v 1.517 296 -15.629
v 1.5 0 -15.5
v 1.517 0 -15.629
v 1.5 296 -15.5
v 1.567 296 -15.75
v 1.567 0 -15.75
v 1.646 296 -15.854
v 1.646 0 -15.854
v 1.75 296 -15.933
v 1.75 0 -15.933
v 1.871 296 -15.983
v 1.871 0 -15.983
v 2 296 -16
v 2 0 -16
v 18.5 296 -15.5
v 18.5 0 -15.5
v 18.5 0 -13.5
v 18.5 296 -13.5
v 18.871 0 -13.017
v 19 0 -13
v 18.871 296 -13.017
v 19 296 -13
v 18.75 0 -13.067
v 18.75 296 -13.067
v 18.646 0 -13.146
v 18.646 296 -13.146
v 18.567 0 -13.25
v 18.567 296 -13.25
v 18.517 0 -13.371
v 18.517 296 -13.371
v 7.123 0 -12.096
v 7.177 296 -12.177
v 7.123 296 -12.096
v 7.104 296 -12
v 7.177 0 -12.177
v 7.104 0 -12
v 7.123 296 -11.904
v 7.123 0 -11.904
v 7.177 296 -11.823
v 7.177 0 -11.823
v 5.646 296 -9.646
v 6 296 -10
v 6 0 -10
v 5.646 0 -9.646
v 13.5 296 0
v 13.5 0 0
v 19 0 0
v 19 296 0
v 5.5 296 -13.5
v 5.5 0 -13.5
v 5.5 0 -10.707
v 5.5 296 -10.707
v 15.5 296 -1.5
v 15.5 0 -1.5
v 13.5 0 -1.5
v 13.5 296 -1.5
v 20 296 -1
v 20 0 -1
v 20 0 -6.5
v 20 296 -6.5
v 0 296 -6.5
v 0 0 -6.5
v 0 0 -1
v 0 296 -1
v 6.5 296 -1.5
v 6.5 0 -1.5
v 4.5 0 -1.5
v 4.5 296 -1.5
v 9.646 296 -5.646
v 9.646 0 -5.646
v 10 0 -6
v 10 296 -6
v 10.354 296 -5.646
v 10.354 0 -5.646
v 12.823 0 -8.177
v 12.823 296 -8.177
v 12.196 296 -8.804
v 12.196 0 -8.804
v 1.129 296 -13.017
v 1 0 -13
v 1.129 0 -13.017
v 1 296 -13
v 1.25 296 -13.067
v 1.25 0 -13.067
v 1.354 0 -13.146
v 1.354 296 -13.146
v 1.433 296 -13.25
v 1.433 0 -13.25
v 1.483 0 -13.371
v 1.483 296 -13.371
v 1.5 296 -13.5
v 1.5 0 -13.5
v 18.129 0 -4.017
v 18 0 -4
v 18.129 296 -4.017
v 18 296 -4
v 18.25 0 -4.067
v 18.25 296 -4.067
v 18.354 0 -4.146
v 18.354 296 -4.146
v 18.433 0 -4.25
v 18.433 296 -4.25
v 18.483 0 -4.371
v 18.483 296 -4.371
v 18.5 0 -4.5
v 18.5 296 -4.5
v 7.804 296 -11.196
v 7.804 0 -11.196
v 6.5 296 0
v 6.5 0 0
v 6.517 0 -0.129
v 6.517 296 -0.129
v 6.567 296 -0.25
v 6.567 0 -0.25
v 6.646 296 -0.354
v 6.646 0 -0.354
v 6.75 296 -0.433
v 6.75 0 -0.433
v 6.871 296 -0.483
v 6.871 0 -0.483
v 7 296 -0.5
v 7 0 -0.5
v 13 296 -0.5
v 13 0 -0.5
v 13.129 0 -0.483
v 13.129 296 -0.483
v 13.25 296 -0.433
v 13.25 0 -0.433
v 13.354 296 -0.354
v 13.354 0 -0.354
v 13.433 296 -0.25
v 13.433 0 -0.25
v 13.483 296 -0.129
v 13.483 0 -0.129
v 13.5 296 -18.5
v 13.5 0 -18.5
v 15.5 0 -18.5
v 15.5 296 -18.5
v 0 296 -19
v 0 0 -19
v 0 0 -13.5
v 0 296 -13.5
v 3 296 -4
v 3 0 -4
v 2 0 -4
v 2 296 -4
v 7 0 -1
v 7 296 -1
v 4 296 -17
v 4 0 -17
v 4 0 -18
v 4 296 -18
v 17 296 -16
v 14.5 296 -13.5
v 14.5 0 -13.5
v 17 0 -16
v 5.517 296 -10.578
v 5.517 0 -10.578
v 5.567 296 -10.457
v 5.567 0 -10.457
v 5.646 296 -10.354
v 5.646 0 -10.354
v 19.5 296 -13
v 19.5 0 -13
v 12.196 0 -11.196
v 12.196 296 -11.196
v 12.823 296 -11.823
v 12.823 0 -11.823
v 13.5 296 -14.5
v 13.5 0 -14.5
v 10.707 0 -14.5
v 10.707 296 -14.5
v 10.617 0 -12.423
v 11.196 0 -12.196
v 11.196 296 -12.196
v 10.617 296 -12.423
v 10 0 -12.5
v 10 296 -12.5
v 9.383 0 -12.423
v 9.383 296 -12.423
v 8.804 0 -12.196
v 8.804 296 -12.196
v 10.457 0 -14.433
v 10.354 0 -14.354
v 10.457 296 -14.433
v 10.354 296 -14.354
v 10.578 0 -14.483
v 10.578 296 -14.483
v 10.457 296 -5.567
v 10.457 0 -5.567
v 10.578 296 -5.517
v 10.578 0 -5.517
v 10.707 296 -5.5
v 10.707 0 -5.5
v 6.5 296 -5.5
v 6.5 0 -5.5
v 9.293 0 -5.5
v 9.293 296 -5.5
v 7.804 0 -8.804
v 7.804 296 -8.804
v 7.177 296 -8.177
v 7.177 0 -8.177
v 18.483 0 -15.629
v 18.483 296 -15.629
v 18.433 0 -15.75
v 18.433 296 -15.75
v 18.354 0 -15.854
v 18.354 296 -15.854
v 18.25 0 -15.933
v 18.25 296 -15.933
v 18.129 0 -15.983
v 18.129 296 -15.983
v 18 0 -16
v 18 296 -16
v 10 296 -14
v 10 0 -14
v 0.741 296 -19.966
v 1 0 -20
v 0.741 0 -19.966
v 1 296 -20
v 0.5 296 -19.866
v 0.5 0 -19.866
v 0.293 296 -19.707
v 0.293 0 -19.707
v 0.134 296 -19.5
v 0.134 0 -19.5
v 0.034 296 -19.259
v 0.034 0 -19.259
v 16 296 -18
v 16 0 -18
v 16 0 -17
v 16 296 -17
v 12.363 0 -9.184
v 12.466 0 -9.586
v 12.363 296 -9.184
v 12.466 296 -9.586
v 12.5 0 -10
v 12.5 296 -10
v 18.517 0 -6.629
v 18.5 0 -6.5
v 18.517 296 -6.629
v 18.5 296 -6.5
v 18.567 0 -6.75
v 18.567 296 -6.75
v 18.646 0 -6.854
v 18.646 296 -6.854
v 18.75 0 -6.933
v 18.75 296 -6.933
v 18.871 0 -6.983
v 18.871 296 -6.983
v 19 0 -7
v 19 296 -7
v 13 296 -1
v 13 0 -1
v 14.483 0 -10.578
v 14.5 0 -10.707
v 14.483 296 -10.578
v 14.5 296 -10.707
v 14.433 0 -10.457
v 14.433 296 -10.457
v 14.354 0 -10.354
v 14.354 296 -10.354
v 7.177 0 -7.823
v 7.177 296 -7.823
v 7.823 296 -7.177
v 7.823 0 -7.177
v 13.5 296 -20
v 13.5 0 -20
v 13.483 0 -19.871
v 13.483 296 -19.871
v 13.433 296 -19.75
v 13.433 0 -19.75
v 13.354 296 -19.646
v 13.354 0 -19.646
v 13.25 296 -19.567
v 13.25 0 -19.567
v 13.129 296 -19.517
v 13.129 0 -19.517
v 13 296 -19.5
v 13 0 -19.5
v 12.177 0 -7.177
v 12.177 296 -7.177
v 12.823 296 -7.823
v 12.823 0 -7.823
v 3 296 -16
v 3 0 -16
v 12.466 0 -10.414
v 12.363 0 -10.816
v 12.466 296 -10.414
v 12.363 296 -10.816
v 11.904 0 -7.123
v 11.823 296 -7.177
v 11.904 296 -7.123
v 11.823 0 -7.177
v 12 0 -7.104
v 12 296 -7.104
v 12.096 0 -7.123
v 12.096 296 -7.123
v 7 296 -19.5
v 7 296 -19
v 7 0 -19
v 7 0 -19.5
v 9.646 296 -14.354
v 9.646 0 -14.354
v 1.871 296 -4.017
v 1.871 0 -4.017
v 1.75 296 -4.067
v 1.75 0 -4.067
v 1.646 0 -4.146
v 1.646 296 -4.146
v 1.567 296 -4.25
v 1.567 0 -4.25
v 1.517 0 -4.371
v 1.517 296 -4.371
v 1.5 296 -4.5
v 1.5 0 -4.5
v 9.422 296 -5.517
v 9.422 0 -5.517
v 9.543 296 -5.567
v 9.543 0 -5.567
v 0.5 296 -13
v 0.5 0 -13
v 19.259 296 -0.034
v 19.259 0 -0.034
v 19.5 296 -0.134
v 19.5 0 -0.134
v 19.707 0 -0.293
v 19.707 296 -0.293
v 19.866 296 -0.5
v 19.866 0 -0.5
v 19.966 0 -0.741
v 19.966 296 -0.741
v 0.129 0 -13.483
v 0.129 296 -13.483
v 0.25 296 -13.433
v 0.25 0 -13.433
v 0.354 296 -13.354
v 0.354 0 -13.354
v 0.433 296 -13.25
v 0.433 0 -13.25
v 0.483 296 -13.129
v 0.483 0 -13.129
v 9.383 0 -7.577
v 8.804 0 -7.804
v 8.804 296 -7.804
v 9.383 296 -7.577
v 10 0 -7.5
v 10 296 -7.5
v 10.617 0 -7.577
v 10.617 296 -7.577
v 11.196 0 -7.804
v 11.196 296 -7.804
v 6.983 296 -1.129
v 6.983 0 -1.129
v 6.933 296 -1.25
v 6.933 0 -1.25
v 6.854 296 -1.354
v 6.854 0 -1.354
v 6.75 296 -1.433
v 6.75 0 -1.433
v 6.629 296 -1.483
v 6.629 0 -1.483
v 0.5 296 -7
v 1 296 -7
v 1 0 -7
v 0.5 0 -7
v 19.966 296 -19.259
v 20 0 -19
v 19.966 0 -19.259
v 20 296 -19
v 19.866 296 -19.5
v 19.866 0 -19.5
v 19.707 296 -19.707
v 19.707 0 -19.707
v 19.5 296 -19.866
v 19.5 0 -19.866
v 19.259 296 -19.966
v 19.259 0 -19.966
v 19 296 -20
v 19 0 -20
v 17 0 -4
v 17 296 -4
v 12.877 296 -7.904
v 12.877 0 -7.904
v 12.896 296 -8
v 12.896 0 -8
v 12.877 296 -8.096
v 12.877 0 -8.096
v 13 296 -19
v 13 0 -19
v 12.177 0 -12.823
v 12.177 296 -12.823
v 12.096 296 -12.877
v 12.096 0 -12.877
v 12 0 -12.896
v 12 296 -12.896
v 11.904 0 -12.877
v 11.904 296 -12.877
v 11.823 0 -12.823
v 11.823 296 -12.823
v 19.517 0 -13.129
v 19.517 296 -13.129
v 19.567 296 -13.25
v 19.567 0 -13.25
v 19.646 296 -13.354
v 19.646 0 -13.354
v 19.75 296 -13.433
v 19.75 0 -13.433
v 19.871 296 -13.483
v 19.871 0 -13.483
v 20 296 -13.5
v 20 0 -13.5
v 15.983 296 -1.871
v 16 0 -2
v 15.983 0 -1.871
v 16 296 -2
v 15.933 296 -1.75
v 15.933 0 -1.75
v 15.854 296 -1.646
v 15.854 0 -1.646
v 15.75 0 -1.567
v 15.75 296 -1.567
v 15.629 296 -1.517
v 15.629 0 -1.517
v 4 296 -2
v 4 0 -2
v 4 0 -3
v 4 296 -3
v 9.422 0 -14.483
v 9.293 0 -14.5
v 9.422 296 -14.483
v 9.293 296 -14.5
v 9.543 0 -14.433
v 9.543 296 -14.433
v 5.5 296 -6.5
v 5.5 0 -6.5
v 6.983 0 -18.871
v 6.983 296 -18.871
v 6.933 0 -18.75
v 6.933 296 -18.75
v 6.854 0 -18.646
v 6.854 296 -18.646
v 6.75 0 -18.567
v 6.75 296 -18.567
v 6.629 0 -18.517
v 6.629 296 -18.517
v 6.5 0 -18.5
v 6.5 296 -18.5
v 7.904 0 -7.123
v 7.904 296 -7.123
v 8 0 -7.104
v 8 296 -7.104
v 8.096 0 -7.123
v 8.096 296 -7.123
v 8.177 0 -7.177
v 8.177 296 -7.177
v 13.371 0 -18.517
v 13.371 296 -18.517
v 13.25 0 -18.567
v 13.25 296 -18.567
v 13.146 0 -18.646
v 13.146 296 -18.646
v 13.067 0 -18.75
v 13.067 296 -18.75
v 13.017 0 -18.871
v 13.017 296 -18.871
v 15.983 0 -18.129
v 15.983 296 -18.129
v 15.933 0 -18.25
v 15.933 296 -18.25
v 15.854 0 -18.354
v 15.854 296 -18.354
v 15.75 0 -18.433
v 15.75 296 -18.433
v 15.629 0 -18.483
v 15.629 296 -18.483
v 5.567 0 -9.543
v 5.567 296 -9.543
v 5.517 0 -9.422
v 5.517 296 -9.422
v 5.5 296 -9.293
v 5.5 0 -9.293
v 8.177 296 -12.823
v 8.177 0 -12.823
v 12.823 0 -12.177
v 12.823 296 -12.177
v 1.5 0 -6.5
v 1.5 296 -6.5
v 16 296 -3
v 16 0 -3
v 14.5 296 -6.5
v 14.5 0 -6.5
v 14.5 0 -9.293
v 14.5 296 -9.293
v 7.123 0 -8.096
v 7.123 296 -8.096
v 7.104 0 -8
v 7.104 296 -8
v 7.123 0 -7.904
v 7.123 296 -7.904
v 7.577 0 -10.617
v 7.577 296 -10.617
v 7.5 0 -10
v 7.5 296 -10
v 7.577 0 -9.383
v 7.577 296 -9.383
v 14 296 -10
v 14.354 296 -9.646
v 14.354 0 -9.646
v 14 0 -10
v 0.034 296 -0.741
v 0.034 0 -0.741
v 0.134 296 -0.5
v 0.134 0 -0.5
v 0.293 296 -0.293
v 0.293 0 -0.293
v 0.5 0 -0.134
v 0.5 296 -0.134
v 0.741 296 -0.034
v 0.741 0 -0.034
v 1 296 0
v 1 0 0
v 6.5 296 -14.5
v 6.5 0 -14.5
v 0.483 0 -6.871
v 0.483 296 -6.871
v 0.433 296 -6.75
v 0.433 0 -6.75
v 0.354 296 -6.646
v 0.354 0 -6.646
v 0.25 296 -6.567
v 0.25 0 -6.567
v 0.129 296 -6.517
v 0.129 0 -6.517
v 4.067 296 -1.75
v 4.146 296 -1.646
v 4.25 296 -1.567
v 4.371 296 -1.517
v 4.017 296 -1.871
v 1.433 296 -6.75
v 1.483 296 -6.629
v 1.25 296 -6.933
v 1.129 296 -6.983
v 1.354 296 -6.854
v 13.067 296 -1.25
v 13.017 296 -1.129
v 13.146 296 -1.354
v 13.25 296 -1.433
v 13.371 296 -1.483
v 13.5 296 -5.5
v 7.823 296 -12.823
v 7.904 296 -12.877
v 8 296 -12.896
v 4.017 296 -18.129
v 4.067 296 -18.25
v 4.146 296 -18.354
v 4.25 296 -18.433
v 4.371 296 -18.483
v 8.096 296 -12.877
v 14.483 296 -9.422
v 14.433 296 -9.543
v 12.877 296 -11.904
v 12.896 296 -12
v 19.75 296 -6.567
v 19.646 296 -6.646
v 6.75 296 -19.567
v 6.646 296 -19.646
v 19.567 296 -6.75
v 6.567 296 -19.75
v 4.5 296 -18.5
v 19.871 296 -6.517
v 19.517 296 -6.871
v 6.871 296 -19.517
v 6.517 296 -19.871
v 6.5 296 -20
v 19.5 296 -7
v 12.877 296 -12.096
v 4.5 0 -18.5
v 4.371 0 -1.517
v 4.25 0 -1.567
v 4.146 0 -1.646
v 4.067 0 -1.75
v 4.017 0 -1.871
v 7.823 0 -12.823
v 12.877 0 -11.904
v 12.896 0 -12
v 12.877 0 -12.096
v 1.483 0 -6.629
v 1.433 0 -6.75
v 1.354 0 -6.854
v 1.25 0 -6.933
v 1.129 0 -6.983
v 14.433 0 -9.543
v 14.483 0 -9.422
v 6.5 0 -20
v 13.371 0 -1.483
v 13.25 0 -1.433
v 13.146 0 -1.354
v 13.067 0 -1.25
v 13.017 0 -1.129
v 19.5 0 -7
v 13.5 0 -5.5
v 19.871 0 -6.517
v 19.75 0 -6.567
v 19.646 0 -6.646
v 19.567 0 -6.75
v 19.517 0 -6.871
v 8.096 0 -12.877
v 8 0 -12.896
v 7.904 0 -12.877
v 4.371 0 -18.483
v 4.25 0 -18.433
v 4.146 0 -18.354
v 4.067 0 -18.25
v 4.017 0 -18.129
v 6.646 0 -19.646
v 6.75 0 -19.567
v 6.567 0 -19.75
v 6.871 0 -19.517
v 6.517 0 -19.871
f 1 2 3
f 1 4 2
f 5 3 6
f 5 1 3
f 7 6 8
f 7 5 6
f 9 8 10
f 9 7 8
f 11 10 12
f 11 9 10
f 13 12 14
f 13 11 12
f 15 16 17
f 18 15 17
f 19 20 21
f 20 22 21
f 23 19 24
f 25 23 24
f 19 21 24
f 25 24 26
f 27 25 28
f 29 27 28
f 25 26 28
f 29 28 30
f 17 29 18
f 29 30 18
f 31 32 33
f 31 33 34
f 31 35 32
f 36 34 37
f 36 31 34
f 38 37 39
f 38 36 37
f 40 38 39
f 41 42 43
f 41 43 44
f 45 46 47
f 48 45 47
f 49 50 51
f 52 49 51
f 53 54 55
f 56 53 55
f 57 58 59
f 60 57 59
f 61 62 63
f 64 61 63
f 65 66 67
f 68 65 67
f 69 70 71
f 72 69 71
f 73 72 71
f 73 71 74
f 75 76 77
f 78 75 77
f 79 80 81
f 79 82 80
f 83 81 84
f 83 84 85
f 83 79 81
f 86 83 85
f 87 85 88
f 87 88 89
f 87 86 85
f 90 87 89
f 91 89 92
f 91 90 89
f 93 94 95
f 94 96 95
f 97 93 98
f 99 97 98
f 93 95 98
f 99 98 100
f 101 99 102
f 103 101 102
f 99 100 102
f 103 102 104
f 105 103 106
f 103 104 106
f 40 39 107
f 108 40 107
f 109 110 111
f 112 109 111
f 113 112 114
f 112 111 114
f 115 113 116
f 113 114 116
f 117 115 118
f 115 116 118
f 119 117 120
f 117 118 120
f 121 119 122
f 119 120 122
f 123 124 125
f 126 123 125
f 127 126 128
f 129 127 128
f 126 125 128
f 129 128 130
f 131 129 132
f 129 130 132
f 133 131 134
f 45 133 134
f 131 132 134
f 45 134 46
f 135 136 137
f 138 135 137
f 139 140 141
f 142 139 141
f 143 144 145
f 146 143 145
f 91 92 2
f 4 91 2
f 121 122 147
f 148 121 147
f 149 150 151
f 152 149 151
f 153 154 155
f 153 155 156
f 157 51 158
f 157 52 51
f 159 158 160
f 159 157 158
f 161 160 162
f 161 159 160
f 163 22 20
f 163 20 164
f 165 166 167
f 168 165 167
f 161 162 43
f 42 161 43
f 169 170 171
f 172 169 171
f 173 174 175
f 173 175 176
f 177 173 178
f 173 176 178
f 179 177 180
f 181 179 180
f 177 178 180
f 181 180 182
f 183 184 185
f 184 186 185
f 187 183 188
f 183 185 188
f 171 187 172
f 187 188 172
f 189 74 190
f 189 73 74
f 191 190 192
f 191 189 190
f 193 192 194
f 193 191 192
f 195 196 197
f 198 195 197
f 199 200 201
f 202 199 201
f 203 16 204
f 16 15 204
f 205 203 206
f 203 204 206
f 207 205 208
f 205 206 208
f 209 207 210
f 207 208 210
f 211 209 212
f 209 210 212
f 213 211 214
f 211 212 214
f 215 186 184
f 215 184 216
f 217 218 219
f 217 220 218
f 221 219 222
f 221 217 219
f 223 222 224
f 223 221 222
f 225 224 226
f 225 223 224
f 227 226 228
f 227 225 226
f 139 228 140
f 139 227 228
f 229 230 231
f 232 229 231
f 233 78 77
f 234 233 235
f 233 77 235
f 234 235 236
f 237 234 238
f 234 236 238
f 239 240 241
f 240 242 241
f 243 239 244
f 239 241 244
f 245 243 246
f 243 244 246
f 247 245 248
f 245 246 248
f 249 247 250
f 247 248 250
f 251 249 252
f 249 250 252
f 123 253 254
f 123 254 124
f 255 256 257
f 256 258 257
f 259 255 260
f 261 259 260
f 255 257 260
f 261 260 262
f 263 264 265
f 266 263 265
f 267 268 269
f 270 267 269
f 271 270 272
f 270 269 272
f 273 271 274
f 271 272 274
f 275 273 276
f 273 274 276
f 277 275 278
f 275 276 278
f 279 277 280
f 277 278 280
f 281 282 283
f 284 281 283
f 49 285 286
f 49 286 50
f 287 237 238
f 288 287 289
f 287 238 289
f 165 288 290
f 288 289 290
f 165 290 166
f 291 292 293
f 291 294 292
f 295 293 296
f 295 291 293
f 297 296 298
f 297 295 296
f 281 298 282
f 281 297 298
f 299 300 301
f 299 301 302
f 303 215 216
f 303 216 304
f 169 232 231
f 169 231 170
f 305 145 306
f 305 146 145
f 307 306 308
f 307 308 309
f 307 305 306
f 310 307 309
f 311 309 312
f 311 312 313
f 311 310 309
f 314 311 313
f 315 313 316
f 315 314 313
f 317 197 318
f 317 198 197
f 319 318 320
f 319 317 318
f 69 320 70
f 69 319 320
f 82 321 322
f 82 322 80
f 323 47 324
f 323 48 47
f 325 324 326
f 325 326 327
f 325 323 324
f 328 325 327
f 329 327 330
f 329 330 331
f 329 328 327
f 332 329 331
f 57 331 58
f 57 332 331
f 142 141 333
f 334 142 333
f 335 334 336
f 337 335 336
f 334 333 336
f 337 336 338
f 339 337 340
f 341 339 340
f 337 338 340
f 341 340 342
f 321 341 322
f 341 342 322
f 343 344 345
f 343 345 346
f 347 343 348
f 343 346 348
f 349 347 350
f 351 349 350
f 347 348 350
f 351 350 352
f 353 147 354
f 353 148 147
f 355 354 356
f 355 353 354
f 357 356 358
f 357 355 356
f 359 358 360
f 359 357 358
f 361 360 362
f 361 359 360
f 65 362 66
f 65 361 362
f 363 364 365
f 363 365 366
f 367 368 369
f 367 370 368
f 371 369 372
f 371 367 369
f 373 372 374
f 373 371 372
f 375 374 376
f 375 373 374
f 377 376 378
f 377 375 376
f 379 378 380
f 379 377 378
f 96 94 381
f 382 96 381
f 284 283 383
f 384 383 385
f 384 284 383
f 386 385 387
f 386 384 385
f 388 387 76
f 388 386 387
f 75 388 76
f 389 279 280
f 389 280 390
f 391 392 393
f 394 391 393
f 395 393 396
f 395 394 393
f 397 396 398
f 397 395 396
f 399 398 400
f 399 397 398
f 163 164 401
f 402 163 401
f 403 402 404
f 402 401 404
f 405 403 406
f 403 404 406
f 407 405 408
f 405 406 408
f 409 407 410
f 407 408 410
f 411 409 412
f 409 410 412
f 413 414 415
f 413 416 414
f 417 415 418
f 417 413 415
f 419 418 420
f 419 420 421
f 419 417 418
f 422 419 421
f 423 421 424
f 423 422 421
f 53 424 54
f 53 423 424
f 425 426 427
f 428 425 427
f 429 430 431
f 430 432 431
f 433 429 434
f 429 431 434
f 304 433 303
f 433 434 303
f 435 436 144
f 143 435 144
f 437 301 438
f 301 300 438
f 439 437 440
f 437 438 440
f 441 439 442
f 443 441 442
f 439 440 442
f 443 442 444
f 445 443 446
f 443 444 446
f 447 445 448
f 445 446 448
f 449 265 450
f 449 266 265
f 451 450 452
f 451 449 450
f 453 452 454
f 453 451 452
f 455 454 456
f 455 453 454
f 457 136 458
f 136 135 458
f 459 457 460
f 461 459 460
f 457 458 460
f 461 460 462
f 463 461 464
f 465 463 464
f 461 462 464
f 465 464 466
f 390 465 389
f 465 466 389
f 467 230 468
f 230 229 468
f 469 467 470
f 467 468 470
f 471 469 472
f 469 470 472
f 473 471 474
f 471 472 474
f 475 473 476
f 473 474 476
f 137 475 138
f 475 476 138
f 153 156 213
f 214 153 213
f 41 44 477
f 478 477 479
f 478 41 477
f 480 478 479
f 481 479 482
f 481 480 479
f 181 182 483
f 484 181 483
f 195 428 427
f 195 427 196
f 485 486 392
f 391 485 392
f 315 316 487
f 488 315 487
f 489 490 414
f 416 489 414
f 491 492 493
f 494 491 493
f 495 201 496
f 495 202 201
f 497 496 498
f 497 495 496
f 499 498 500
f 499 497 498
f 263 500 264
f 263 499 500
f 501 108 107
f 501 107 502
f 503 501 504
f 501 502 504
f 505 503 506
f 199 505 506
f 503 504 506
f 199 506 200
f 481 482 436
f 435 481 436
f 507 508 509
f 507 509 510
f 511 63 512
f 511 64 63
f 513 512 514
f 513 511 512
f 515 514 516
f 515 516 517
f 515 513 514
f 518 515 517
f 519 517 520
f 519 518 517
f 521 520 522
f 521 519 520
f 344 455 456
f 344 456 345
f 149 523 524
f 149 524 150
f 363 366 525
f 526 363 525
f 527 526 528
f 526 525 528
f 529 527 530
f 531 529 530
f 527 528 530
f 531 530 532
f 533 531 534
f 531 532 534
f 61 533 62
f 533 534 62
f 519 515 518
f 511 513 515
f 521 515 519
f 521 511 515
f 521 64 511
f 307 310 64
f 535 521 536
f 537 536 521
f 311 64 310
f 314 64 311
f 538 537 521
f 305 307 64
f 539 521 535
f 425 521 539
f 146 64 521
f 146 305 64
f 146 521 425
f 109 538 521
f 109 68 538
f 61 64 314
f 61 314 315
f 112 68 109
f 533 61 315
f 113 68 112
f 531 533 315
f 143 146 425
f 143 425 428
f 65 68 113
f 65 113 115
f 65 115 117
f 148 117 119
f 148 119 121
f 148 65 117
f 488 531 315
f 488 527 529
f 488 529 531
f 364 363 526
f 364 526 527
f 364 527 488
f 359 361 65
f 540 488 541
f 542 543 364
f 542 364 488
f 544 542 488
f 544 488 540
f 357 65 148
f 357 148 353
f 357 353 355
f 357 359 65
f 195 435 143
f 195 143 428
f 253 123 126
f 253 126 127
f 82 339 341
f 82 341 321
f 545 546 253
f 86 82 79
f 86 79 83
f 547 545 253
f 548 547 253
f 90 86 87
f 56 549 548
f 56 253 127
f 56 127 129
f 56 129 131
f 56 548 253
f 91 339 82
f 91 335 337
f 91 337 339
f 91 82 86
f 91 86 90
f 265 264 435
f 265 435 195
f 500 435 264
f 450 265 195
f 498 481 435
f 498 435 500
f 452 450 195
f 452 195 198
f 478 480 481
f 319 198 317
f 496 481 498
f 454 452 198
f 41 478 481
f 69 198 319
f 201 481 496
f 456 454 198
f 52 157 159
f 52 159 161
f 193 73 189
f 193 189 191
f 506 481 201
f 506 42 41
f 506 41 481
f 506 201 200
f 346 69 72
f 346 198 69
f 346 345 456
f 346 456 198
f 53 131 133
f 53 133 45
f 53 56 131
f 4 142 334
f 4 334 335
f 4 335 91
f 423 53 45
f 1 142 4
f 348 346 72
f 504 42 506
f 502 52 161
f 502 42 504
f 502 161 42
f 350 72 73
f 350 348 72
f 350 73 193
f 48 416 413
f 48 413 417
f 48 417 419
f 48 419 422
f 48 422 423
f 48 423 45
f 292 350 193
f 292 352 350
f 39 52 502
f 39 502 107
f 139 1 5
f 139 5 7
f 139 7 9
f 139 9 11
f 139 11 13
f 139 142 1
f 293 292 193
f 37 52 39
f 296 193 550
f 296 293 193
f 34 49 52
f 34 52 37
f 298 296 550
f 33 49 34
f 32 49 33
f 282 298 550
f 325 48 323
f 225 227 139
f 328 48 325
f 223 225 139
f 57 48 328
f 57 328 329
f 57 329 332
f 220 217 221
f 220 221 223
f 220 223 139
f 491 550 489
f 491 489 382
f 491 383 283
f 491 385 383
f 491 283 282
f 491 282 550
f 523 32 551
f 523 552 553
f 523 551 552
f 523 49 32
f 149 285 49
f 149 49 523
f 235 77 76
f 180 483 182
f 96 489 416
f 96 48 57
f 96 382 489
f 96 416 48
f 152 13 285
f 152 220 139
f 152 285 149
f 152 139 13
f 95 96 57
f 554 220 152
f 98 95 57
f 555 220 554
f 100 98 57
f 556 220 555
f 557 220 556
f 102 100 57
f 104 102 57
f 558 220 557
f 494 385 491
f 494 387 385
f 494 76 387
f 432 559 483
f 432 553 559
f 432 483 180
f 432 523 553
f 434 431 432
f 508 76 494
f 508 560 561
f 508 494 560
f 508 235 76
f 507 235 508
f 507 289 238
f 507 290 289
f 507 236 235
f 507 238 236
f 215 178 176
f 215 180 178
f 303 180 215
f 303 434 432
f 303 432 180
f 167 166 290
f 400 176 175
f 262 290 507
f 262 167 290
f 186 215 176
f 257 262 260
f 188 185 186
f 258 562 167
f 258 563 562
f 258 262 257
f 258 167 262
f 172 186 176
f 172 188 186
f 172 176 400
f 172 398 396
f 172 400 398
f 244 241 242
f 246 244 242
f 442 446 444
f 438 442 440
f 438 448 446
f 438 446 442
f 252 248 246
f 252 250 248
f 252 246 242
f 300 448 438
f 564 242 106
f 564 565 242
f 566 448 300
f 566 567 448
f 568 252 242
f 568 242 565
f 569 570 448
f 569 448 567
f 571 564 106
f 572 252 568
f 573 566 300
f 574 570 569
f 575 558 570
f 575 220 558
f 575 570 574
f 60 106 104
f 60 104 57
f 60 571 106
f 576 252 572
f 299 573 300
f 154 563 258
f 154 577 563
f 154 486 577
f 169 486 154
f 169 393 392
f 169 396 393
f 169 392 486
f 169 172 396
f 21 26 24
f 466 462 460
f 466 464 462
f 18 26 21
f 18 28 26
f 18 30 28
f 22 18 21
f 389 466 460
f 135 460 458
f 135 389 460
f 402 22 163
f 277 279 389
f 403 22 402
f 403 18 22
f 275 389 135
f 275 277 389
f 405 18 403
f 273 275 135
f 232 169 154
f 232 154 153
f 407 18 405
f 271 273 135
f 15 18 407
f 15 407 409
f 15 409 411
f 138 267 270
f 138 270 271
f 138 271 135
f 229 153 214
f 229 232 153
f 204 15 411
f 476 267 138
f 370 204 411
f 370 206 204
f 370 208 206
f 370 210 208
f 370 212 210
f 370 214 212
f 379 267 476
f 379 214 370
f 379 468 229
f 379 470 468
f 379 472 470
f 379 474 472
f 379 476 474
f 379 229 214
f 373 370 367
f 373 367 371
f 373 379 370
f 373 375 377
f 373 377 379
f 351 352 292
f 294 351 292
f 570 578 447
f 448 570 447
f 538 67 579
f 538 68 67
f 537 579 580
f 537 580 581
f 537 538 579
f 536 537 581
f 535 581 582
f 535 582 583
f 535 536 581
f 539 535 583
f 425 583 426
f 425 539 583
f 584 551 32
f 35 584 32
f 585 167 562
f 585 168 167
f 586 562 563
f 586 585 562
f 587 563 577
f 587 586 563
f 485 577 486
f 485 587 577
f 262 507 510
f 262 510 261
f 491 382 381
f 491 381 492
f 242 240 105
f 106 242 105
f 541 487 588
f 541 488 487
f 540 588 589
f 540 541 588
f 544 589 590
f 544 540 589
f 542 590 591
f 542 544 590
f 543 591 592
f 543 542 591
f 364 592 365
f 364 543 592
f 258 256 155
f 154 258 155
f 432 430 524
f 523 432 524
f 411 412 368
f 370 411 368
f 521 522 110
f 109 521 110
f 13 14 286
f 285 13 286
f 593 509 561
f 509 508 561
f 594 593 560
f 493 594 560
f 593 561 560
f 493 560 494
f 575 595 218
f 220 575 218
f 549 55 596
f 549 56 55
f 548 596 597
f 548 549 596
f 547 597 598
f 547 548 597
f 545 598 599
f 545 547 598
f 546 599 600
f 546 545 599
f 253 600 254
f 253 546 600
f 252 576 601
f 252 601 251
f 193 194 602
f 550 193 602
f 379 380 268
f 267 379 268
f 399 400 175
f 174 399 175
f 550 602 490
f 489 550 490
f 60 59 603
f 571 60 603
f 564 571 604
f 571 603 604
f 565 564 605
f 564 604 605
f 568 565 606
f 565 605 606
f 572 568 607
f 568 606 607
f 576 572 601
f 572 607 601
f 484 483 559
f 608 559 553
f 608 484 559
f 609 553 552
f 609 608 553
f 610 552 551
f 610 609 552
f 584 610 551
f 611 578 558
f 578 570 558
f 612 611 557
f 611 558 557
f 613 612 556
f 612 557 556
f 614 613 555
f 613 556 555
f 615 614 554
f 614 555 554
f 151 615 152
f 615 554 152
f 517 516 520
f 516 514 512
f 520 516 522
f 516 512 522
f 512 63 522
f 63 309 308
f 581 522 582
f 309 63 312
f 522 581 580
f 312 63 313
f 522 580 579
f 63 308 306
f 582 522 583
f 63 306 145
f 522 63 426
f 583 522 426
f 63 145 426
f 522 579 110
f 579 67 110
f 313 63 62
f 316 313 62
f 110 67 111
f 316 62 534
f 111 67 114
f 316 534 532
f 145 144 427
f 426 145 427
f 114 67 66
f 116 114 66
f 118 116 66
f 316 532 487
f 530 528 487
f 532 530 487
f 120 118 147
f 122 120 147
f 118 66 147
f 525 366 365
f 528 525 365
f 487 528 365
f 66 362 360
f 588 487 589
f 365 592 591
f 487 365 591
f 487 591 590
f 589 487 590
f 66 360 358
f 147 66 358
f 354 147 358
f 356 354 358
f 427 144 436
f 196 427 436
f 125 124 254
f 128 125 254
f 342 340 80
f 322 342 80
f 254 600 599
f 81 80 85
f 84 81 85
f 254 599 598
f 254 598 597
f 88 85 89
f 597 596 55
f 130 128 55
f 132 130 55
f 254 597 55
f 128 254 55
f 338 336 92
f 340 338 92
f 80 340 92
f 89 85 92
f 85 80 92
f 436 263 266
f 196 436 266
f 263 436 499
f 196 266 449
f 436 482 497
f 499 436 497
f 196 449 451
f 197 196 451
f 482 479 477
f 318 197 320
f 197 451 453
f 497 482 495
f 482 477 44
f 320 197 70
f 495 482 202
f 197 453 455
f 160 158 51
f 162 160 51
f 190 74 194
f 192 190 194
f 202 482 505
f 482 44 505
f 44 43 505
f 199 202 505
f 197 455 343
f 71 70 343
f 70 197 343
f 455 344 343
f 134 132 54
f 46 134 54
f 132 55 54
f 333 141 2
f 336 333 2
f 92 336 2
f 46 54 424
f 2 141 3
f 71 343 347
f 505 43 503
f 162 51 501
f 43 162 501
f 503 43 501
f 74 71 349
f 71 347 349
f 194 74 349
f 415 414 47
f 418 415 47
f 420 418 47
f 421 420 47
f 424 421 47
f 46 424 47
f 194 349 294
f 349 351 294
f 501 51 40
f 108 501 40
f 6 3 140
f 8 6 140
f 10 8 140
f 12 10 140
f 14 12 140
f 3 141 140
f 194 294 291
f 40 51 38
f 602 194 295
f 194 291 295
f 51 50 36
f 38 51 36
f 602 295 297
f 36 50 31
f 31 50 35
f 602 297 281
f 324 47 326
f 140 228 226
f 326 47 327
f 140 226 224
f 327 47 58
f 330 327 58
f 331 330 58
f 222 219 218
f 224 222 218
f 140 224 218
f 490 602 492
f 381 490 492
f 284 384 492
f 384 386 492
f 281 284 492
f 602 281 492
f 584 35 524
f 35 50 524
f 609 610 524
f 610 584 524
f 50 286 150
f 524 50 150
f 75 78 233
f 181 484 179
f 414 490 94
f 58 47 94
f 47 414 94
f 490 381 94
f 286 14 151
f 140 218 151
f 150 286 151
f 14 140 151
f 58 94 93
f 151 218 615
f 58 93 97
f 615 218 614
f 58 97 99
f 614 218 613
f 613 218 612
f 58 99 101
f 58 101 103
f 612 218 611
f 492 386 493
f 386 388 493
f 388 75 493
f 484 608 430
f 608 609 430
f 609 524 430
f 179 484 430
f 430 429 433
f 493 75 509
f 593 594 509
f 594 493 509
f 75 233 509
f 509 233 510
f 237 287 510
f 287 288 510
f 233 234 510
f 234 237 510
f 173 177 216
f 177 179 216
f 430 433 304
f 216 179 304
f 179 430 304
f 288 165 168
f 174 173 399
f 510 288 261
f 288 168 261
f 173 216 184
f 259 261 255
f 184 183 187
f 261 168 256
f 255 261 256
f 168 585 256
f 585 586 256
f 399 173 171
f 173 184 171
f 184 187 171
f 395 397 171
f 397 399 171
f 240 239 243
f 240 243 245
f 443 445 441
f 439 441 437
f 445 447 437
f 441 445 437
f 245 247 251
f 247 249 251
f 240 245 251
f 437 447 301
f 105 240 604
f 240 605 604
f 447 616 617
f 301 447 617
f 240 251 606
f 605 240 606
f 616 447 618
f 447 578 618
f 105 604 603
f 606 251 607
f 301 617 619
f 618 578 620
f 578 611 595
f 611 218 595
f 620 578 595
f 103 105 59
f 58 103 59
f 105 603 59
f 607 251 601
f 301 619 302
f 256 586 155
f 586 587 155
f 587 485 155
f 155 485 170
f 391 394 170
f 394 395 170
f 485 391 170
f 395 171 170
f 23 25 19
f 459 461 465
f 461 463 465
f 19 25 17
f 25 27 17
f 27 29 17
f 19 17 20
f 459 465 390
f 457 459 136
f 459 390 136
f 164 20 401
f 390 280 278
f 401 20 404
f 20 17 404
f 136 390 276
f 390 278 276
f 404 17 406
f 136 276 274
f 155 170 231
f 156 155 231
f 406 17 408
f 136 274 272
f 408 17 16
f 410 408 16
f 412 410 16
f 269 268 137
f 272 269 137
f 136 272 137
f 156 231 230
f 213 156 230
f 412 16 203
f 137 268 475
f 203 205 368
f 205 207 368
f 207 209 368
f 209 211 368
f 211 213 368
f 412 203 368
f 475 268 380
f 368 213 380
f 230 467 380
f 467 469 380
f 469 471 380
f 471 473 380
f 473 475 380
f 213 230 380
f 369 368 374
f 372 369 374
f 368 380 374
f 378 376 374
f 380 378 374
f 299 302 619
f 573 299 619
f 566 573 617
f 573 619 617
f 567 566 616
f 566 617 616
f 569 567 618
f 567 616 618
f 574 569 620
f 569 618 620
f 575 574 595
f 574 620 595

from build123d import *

# Parameters (mm, degrees)
BOSS_EXTRUDE1_DEPTH = 296
FILLET1_R           = 1
CUT_EXTRUDE1_DEPTH  = 297
FILLET2_R           = 0.5
FILLET3_R           = 0.25


with BuildPart() as part:
    # Sketch3 → Boss-Extrude1 (new body)
    with BuildSketch(Plane(origin=(0, 0, 0), x_dir=(1, 0, 0), z_dir=(0, 1, 0))):
        with BuildLine():
            Line((7, 18.5), (7, 19.5))
            ThreePointArc((7, 19.5), (6.646446609, 19.646446609), (6.5, 20))
            Line((6.5, 20), (0, 20))
            Line((0, 20), (0, 13.5))
            ThreePointArc((0, 13.5), (0.353553391, 13.353553391), (0.5, 13))
            Line((0.5, 13), (1.5, 13))
            Line((1.5, 13), (1.5, 16))
            Line((1.5, 16), (3, 16))
            Line((3, 16), (5.5, 13.5))
            Line((5.5, 13.5), (5.5, 10.5))
            Line((5.5, 10.5), (6, 10))
            Line((6, 10), (5.5, 9.5))
            Line((5.5, 9.5), (5.5, 6.5))
            Line((5.5, 6.5), (3, 4))
            Line((3, 4), (1.5, 4))
            Line((1.5, 4), (1.5, 7))
            Line((1.5, 7), (0.5, 7))
            ThreePointArc((0.5, 7), (0.353553391, 6.646446609), (0, 6.5))
            Line((0, 6.5), (0, 0))
            Line((0, 0), (6.5, 0))
            ThreePointArc((6.5, 0), (6.646446609, 0.353553391), (7, 0.5))
            Line((7, 0.5), (7, 1.5))
            Line((7, 1.5), (4, 1.5))
            Line((4, 1.5), (4, 3))
            Line((4, 3), (6.5, 5.5))
            Line((6.5, 5.5), (9.5, 5.5))
            Line((9.5, 5.5), (10, 6))
            Line((10, 6), (10.5, 5.5))
            Line((10.5, 5.5), (13.5, 5.5))
            Line((13.5, 5.5), (16, 3))
            Line((16, 3), (16, 1.5))
            Line((16, 1.5), (13, 1.5))
            Line((13, 1.5), (13, 0.5))
            ThreePointArc((13, 0.5), (13.353553391, 0.353553391), (13.5, 0))
            Line((13.5, 0), (20, 0))
            Line((20, 0), (20, 6.5))
            ThreePointArc((20, 6.5), (19.646446609, 6.646446609), (19.5, 7))
            Line((19.5, 7), (18.5, 7))
            Line((18.5, 7), (18.5, 4))
            Line((18.5, 4), (17, 4))
            Line((17, 4), (14.5, 6.5))
            Line((14.5, 6.5), (14.5, 9.5))
            Line((14.5, 9.5), (14, 10))
            Line((14, 10), (14.5, 10.5))
            Line((14.5, 10.5), (14.5, 13.5))
            Line((14.5, 13.5), (17, 16))
            Line((17, 16), (18.5, 16))
            Line((18.5, 16), (18.5, 13))
            Line((18.5, 13), (19.5, 13))
            ThreePointArc((19.5, 13), (19.646446609, 13.353553391), (20, 13.5))
            Line((20, 13.5), (20, 20))
            Line((20, 20), (13.5, 20))
            ThreePointArc((13.5, 20), (13.353553391, 19.646446609), (13, 19.5))
            Line((13, 19.5), (13, 18.5))
            Line((13, 18.5), (16, 18.5))
            Line((16, 18.5), (16, 17))
            Line((16, 17), (13.5, 14.5))
            Line((13.5, 14.5), (10.5, 14.5))
            Line((10.5, 14.5), (10, 14))
            Line((10, 14), (9.5, 14.5))
            Line((9.5, 14.5), (6.5, 14.5))
            Line((6.5, 14.5), (4, 17))
            Line((4, 17), (4, 18.5))
            Line((4, 18.5), (7, 18.5))
        make_face()
    extrude(amount=BOSS_EXTRUDE1_DEPTH)

    # Fillet1
    fillet1_edges = [part.edges().sort_by_distance(p)[0] for p in [
        (20, 148, 0),
        (0, 148, 0),
        (0, 148, -20),
        (20, 148, -20),
    ]]
    fillet(fillet1_edges, radius=FILLET1_R)

    # Sketch4 → Cut-Extrude1 (cut, through all)
    with BuildSketch(Plane(origin=(0, 296, 0), x_dir=(1, 0, 0), z_dir=(0, 1, 0))):
        with BuildLine():
            Line((10, 11), (11.195582496, 12.195582496))
            ThreePointArc((11.195582496, 12.195582496), (10, 12.5), (8.804417504, 12.195582496))
            Line((8.804417504, 12.195582496), (10, 11))
        make_face()
        with BuildLine():
            ThreePointArc((12.195582496, 11.195582496), (11.767766953, 11.767766953), (11.195582496, 12.195582496))
            Line((11.195582496, 12.195582496), (10, 11))
            Line((10, 11), (11, 10))
            Line((11, 10), (12.195582496, 11.195582496))
        make_face()
        with BuildLine():
            Line((9, 10), (10, 11))
            Line((10, 11), (8.804417504, 12.195582496))
            ThreePointArc((8.804417504, 12.195582496), (8.232233047, 11.767766953), (7.804417504, 11.195582496))
            Line((7.804417504, 11.195582496), (9, 10))
        make_face()
        Polygon((11, 10), (10, 11), (9, 10), (10, 9), align=None)
        with BuildLine():
            Line((7.804417504, 8.804417504), (9, 10))
            Line((9, 10), (7.804417504, 11.195582496))
            ThreePointArc((7.804417504, 11.195582496), (7.5, 10), (7.804417504, 8.804417504))
        make_face()
        with BuildLine():
            Line((10, 9), (9, 10))
            Line((9, 10), (7.804417504, 8.804417504))
            ThreePointArc((7.804417504, 8.804417504), (8.232233047, 8.232233047), (8.804417504, 7.804417504))
            Line((8.804417504, 7.804417504), (10, 9))
        make_face()
        with BuildLine():
            Line((11.195582496, 7.804417504), (10, 9))
            Line((10, 9), (8.804417504, 7.804417504))
            ThreePointArc((8.804417504, 7.804417504), (10, 7.5), (11.195582496, 7.804417504))
        make_face()
        with BuildLine():
            Line((12.195582496, 8.804417504), (11, 10))
            Line((11, 10), (10, 9))
            Line((10, 9), (11.195582496, 7.804417504))
            ThreePointArc((11.195582496, 7.804417504), (11.767766953, 8.232233047), (12.195582496, 8.804417504))
        make_face()
        with BuildLine():
            ThreePointArc((12.5, 10), (12.422700584, 10.616864556), (12.195582496, 11.195582496))
            Line((12.195582496, 11.195582496), (11, 10))
            Line((11, 10), (12.195582496, 8.804417504))
            ThreePointArc((12.195582496, 8.804417504), (12.422700584, 9.383135444), (12.5, 10))
        make_face()
        with BuildLine():
            ThreePointArc((8.804417504, 7.804417504), (8.232233047, 8.232233047), (7.804417504, 8.804417504))
            Line((7.804417504, 8.804417504), (7, 8))
            Line((7, 8), (8, 7))
            Line((8, 7), (8.804417504, 7.804417504))
        make_face()
        with BuildLine():
            Line((13, 8), (12.195582496, 8.804417504))
            ThreePointArc((12.195582496, 8.804417504), (11.767766953, 8.232233047), (11.195582496, 7.804417504))
            Line((11.195582496, 7.804417504), (12, 7))
            Line((12, 7), (13, 8))
        make_face()
        with BuildLine():
            Line((13, 12), (12, 13))
            Line((12, 13), (11.195582496, 12.195582496))
            ThreePointArc((11.195582496, 12.195582496), (11.767766953, 11.767766953), (12.195582496, 11.195582496))
            Line((12.195582496, 11.195582496), (13, 12))
        make_face()
        with BuildLine():
            ThreePointArc((7.804417504, 11.195582496), (8.232233047, 11.767766953), (8.804417504, 12.195582496))
            Line((8.804417504, 12.195582496), (8, 13))
            Line((8, 13), (7, 12))
            Line((7, 12), (7.804417504, 11.195582496))
        make_face()
    extrude(amount=-CUT_EXTRUDE1_DEPTH, mode=Mode.SUBTRACT)

    # Fillet2
    fillet2_edges = [part.edges().sort_by_distance(p)[0] for p in [
        (18.5, 148, -13),
        (18.5, 148, -16),
        (14.5, 148, -10.5),
        (14.5, 148, -9.5),
        (18.5, 148, -4),
        (18.5, 148, -7),
        (13, 148, -1.5),
        (16, 148, -1.5),
        (10.5, 148, -5.5),
        (9.5, 148, -5.5),
        (4, 148, -1.5),
        (7, 148, -1.5),
        (1.5, 148, -7),
        (1.5, 148, -4),
        (5.5, 148, -9.5),
        (5.5, 148, -10.5),
        (1.5, 148, -16),
        (1.5, 148, -13),
        (7, 148, -18.5),
        (4, 148, -18.5),
        (9.5, 148, -14.5),
        (10.5, 148, -14.5),
        (16, 148, -18.5),
        (13, 148, -18.5),
    ]]
    fillet(fillet2_edges, radius=FILLET2_R)

    # Fillet3
    fillet3_edges = [part.edges().sort_by_distance(p)[0] for p in [
        (7, 148, -12),
        (8, 148, -13),
        (12, 148, -13),
        (13, 148, -12),
        (13, 148, -8),
        (12, 148, -7),
        (8, 148, -7),
        (7, 148, -8),
    ]]
    fillet(fillet3_edges, radius=FILLET3_R)


solid = part.part
